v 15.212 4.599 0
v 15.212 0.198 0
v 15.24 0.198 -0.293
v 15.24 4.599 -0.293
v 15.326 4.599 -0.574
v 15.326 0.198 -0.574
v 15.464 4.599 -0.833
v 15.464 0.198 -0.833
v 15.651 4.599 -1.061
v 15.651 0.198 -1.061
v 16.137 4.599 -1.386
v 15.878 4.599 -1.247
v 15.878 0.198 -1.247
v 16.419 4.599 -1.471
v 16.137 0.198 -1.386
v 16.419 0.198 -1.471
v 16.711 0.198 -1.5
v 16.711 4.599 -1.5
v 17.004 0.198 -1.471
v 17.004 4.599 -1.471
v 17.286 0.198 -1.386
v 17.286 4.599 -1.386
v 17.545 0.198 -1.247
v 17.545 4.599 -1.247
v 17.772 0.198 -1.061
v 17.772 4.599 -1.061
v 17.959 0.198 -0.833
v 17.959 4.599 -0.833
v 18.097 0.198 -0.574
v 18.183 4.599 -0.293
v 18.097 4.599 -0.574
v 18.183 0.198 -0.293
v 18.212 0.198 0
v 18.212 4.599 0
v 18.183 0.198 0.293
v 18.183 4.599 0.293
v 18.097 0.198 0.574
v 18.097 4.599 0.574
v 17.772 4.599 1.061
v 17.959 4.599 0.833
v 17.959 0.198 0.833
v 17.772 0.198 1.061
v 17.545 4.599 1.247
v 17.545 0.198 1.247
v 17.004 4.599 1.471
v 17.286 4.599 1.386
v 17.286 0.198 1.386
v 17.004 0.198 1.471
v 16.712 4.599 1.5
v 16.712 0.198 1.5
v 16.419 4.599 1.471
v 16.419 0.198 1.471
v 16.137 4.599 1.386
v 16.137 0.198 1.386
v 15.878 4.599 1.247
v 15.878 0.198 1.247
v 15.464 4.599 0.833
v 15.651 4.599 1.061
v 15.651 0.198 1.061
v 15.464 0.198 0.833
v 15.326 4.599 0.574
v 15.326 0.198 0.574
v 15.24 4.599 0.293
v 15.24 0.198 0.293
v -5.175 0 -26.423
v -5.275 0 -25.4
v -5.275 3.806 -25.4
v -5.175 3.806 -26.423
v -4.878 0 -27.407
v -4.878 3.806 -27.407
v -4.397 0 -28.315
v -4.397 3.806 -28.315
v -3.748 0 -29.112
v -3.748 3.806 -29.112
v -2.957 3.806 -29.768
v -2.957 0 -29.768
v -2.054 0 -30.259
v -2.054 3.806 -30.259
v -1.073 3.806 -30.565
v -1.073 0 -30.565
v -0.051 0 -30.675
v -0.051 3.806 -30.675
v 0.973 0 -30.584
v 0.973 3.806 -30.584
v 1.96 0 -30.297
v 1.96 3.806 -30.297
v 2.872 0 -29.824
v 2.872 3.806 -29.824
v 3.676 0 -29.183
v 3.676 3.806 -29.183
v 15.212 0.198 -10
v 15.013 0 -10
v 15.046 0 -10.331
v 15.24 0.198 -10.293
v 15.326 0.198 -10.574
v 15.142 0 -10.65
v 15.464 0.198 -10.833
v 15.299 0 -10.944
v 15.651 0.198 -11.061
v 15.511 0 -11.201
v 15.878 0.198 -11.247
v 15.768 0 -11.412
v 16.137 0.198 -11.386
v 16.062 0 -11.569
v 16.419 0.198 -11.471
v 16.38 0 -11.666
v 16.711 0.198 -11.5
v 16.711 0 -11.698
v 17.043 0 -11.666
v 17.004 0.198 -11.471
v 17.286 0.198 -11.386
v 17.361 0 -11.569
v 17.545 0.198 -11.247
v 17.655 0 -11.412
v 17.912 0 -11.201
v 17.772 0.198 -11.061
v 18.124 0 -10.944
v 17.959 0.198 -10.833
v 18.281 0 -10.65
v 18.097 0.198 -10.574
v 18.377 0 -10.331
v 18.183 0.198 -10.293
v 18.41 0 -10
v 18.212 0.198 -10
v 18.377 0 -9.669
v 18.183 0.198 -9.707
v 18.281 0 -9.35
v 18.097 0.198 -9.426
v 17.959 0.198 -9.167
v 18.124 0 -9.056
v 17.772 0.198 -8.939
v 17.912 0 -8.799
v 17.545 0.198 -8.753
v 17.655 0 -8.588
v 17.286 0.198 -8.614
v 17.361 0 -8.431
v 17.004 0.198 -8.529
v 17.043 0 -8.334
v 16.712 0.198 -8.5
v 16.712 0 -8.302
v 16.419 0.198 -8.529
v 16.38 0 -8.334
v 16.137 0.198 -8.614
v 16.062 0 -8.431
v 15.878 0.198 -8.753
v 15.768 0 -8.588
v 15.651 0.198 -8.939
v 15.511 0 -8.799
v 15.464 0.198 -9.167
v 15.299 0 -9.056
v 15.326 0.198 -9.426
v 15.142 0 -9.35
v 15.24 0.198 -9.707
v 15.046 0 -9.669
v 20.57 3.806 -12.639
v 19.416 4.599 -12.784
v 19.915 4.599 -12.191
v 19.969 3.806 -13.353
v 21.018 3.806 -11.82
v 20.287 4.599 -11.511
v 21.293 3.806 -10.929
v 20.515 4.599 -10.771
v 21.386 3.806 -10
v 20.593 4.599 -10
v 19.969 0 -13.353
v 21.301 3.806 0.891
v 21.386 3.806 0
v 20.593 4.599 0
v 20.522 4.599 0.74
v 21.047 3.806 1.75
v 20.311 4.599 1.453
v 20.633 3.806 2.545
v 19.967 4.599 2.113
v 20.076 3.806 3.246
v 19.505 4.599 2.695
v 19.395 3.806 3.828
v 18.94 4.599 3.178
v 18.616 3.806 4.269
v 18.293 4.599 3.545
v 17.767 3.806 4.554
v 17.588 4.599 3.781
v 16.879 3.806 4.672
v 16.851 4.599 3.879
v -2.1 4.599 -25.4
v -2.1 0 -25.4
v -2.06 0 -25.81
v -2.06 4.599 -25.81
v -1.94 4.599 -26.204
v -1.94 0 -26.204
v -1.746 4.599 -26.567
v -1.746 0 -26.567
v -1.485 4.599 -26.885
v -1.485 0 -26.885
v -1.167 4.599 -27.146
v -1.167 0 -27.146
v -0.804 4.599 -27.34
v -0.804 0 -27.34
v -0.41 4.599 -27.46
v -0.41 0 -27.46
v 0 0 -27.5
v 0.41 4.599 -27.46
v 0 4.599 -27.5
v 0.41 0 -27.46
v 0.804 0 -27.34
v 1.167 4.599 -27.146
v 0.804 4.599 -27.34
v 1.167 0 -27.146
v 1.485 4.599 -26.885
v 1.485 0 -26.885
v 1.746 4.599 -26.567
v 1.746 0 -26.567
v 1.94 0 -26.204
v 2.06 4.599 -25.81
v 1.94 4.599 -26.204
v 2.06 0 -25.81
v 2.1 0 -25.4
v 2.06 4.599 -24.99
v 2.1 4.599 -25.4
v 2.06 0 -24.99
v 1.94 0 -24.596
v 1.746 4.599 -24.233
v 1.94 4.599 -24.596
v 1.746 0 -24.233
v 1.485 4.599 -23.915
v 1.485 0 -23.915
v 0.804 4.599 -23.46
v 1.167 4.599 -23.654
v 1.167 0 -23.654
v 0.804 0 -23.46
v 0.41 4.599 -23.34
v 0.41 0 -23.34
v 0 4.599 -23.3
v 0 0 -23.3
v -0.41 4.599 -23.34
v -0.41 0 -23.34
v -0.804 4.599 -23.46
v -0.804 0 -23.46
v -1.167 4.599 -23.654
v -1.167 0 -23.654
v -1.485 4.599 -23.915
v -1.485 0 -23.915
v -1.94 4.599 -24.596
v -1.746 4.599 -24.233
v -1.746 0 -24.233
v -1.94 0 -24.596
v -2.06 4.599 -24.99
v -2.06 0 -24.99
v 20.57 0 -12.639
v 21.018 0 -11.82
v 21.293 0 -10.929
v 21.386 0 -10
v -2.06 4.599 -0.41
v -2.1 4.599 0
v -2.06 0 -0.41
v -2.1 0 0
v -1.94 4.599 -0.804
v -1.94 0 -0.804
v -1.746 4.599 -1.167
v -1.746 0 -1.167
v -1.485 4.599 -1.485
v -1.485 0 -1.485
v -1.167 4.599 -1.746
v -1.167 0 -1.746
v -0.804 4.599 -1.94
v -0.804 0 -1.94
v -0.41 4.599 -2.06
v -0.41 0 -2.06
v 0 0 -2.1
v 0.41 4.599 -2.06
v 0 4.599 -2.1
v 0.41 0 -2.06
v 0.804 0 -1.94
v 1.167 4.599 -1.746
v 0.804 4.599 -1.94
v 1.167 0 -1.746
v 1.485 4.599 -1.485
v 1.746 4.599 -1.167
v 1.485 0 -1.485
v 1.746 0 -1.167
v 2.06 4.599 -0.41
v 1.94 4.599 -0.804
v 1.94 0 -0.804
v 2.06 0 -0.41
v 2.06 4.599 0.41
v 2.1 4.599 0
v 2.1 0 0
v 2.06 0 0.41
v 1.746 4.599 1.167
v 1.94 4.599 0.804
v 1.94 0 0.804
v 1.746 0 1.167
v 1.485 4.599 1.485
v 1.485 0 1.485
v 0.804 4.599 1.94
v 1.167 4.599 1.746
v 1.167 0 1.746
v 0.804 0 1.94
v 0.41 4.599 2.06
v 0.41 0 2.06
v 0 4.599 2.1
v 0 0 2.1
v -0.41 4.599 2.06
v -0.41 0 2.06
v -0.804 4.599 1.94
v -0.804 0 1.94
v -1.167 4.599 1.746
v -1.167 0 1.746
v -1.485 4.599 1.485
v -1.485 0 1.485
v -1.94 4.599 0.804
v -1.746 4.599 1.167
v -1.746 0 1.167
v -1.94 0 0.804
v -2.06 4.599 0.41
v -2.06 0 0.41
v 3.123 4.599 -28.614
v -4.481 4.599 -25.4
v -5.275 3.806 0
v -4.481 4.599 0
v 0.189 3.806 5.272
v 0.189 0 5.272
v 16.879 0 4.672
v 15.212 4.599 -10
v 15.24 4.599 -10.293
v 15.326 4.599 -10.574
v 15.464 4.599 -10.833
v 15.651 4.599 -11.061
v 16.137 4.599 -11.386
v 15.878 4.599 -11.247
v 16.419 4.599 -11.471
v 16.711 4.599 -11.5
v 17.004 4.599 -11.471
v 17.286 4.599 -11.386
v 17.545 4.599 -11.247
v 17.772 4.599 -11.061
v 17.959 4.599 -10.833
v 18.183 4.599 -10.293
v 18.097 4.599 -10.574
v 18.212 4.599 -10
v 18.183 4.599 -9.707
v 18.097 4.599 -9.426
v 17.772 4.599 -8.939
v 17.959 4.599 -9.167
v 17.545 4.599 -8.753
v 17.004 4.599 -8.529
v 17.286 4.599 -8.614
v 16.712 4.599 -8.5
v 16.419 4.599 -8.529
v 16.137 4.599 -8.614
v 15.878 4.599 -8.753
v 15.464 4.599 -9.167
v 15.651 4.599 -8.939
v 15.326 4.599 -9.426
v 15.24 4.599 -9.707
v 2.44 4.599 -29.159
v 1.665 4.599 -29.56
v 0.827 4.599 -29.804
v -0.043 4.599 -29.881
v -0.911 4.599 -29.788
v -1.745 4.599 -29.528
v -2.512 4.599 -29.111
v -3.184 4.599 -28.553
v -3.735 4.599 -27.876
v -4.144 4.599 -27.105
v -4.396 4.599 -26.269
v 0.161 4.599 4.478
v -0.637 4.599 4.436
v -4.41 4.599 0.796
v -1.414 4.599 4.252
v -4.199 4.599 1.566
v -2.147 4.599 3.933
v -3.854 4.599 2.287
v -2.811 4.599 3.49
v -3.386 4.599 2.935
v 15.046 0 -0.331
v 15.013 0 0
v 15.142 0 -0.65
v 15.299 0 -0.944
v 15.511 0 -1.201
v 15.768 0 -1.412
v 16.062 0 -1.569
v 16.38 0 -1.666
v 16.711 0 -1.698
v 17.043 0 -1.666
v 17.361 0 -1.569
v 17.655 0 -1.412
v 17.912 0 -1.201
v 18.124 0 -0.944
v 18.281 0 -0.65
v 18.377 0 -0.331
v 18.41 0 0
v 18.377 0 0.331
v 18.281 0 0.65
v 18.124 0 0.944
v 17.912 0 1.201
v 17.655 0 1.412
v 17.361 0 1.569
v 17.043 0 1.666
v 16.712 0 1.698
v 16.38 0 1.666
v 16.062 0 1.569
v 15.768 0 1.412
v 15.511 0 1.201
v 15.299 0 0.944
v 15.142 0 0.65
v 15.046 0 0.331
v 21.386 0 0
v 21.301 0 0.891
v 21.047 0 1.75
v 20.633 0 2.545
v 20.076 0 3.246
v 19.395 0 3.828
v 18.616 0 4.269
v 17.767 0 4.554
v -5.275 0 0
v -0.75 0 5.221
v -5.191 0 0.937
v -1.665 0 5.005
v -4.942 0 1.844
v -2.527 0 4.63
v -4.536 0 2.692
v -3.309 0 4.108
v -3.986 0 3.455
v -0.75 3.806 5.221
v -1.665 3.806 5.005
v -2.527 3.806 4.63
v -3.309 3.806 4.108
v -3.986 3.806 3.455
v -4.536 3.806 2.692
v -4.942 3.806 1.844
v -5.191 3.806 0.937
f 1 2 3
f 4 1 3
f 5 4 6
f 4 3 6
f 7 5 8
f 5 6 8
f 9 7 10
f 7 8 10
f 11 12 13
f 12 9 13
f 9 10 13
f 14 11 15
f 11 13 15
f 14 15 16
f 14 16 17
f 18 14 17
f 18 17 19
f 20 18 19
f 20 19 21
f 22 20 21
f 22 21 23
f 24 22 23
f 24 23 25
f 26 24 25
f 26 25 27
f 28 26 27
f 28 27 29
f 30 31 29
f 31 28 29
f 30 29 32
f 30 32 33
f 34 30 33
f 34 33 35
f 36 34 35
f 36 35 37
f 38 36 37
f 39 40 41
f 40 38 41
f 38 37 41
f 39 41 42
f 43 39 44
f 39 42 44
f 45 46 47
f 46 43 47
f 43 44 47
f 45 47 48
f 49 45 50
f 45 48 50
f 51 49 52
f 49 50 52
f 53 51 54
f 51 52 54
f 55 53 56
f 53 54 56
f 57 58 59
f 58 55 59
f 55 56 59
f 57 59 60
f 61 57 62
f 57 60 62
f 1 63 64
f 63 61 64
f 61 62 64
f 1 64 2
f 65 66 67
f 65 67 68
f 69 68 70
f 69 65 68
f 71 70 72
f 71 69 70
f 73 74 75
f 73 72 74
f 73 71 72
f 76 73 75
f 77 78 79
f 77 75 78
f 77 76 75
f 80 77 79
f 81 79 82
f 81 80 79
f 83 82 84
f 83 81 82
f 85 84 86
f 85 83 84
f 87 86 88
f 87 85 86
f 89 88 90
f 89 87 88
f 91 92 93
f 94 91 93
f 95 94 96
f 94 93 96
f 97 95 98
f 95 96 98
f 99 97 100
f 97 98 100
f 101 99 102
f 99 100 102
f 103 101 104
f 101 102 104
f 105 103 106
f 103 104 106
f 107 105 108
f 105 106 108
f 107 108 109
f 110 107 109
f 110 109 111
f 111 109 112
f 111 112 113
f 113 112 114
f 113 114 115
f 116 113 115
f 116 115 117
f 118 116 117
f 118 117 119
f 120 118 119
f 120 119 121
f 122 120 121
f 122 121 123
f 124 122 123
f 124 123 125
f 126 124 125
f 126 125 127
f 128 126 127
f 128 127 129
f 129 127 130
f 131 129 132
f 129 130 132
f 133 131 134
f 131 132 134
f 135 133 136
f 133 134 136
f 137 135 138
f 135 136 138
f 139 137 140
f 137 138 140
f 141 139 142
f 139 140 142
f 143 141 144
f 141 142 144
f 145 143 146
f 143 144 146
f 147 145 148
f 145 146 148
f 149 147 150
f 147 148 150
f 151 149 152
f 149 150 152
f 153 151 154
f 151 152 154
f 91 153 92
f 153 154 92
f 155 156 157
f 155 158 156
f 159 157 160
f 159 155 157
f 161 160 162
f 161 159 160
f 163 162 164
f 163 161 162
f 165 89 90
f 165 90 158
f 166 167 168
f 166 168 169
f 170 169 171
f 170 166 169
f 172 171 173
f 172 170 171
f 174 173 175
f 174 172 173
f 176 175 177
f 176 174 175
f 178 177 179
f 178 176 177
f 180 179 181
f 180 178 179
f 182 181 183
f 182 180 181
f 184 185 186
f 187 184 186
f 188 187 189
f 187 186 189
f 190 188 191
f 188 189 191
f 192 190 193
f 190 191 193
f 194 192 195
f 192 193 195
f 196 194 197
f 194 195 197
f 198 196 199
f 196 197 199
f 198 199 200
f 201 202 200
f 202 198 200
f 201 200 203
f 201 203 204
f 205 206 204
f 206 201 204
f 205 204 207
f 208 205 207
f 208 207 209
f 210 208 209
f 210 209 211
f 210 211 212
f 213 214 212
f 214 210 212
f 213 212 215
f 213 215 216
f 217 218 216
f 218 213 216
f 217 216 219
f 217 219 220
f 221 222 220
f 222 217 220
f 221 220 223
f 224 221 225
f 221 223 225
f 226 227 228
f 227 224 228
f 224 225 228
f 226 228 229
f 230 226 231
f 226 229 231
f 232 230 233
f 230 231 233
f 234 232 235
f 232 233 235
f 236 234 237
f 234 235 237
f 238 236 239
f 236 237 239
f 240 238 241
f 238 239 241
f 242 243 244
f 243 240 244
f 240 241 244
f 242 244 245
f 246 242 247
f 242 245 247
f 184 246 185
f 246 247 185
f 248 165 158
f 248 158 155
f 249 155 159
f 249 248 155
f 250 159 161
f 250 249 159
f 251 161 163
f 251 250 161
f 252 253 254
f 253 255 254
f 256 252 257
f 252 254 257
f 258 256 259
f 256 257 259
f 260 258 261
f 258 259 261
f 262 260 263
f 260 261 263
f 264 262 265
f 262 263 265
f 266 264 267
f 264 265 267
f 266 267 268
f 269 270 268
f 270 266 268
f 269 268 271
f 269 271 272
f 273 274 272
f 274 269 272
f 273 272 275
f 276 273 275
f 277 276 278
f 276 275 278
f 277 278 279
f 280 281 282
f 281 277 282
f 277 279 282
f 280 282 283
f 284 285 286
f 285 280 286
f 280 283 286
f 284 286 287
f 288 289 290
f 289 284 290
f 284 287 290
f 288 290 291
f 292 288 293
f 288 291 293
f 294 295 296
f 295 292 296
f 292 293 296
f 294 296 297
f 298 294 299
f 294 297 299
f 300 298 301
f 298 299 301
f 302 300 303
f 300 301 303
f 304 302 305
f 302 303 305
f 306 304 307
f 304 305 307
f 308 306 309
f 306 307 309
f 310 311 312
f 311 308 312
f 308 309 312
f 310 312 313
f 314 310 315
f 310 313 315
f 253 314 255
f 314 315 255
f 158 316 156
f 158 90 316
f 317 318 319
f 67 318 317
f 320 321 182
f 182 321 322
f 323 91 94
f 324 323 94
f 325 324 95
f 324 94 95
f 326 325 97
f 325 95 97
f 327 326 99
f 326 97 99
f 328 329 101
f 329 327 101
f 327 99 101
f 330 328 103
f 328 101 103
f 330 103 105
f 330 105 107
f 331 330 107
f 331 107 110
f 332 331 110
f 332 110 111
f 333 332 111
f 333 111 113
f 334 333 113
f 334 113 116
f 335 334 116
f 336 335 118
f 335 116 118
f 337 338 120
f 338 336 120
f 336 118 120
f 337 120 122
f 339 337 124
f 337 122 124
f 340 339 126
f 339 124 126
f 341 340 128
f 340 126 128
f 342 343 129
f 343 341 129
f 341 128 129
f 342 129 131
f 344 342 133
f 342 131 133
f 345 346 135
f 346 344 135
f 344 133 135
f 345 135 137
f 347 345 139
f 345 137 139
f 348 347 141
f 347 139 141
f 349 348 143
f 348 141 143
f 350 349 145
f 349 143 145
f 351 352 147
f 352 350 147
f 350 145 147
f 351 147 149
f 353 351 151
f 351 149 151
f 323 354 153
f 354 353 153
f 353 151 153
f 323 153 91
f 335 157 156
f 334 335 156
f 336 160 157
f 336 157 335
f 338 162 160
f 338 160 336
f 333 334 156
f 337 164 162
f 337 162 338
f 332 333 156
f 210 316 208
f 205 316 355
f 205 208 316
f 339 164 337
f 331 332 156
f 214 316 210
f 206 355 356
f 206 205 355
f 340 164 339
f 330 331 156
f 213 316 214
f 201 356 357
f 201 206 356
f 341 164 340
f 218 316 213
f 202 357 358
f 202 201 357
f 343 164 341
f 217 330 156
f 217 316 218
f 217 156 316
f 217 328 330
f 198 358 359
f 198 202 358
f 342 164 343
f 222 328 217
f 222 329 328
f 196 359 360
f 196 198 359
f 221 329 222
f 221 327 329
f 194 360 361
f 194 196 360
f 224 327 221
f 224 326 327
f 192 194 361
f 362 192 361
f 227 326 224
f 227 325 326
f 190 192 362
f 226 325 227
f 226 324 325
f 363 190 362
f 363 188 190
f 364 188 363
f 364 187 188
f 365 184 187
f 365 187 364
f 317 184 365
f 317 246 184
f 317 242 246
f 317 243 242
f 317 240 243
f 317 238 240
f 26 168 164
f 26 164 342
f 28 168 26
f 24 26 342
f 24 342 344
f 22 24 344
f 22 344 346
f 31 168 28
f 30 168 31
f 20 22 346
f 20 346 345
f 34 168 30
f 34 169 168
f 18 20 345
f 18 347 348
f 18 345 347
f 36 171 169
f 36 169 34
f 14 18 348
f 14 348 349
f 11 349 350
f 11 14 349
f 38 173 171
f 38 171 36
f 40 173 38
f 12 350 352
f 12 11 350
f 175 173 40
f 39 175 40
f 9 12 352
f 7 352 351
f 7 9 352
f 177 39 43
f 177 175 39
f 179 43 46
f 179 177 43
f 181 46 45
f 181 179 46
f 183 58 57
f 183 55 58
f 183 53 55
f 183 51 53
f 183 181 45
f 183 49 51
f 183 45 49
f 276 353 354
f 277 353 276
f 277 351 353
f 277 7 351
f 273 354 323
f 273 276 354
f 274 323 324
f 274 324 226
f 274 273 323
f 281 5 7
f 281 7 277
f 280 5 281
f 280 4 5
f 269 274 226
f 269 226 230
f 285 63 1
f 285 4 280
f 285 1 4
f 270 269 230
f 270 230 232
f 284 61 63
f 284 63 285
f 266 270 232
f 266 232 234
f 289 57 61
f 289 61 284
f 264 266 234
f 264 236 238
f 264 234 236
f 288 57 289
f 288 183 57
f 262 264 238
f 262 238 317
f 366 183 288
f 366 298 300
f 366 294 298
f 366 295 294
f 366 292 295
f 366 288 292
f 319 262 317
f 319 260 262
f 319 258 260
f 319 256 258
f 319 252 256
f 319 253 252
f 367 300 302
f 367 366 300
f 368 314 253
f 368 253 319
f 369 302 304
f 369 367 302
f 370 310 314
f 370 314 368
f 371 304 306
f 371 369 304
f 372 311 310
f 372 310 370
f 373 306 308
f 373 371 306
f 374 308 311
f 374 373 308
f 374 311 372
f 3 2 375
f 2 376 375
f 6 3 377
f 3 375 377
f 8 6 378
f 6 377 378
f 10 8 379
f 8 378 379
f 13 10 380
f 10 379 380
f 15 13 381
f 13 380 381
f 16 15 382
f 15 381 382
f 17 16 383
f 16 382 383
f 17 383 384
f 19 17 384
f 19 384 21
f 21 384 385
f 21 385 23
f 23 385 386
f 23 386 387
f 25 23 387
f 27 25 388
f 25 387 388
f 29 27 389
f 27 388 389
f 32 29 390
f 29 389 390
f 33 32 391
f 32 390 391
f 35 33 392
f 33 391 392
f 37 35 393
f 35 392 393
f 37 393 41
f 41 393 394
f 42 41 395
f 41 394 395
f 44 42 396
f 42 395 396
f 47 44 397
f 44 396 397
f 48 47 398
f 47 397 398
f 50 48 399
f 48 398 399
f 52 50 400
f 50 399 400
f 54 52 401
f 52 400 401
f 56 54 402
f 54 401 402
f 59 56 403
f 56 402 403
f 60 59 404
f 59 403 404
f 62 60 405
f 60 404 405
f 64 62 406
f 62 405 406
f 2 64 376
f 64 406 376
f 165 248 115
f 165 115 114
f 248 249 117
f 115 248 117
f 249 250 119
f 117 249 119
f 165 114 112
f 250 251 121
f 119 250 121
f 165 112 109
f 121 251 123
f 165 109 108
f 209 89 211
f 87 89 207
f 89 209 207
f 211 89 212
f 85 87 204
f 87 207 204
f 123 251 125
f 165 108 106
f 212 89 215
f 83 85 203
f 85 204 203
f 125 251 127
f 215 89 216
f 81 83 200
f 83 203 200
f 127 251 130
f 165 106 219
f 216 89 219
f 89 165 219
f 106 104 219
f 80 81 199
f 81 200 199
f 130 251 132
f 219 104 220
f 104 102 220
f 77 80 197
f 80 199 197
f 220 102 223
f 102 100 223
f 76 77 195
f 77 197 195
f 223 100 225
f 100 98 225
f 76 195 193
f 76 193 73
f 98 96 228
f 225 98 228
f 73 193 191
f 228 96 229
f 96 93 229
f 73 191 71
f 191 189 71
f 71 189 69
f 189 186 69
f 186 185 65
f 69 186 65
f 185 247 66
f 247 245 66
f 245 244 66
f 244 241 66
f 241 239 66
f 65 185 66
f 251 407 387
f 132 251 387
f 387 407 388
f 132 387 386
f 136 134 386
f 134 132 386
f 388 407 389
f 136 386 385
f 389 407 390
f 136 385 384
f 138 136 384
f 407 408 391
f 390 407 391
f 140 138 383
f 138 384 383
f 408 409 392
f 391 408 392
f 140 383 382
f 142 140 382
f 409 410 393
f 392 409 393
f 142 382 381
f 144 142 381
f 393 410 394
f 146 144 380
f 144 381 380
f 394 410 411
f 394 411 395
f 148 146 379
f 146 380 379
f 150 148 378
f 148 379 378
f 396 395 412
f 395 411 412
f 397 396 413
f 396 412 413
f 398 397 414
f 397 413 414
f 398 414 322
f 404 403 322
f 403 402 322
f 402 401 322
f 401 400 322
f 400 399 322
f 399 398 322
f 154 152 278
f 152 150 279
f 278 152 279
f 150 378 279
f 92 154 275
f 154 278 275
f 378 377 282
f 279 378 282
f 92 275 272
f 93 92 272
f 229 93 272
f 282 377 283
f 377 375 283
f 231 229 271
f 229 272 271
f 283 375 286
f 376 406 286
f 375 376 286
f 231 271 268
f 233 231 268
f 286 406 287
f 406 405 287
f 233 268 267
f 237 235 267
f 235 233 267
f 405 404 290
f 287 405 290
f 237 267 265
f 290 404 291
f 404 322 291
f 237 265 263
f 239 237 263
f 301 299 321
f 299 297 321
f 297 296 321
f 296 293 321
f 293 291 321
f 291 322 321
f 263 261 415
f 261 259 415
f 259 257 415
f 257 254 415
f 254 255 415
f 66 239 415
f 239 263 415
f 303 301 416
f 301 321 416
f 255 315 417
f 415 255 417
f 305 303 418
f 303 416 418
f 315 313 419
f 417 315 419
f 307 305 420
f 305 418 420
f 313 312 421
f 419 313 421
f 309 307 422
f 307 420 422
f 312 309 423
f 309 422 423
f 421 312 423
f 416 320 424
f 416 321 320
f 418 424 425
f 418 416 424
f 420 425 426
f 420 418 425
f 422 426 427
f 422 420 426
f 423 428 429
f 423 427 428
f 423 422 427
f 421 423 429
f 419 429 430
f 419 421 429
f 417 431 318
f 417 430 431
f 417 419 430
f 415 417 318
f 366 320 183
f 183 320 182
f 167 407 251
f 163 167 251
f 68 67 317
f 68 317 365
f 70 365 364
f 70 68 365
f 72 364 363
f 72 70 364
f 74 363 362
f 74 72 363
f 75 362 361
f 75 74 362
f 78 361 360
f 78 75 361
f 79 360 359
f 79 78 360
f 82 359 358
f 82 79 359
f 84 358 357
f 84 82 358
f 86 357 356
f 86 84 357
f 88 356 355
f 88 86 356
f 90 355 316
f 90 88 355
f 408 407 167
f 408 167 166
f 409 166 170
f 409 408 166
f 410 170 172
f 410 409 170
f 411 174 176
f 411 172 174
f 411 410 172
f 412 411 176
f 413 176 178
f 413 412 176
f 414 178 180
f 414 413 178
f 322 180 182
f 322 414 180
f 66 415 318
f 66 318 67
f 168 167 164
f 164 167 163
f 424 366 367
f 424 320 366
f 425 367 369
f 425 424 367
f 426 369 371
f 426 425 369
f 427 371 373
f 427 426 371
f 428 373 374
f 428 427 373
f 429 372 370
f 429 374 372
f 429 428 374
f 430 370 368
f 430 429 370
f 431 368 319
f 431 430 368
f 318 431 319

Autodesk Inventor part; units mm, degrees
ref_plane "YZ Plane" through (0, 0, 0) normal (1, 0, 0) x (0, 1, 0)
ref_plane "XZ Plane" through (0, 0, 0) normal (0, 1, 0) x (-1, 0, 0)
ref_plane "XY Plane" through (0, 0, 0) normal (0, 0, 1) x (1, 0, 0)
sketch "Sketch1" plane through (0, 0, 0) normal (0, 1, 0) x (-1, 0, 0)
  circle A0 centre (0, 0) radius 2.1
  circle A1 centre (0, -25.4) radius 2.1
  circle A2 centre (-16.7115, 0) radius 1.5
  circle A3 centre (-16.7115, -10) radius 1.5
  circle A4 centre (0, 0) radius 5.275 construction
  circle A5 centre (0, -25.4) radius 5.275 construction
  circle A6 centre (-16.7115, 0) radius 4.675 construction
  circle A7 centre (-16.7115, -10) radius 4.675 construction
  line L0 (-0.1894, 5.2716) -> (-16.8793, 4.672)
  line L1 (5.275, 0) -> (5.275, -25.4)
  line L2 (-3.6758, -29.1834) -> (-19.9692, -13.353)
  line L3 (-21.3865, 0) -> (-21.3865, -10)
  arc A8 (-3.6758, -29.1834) -> (5.275, -25.4) centre (0, -25.4) ccw
  arc A9 (5.275, 0) -> (-0.1894, 5.2716) centre (0, 0) ccw
  arc A10 (-16.8793, 4.672) -> (-21.3865, 0) centre (-16.7115, 0) ccw
  arc A11 (-21.3865, -10) -> (-19.9692, -13.353) centre (-16.7115, -10) ccw
  dimension "d0" = 4.2
  dimension "d1" = 25.4
  dimension "d2" = 16.7115
  dimension "d3" = 3
  dimension "d4" = 10
  dimension "d5" = 3.175
  dimension "d6" = 3.175
extrude "Extrusion1" add sketch "Sketch1" along normal blind 4.5994
chamfer "Chamfer1" distance 0.1984 angle 45 2 edges at (18.2115, 0, 0) (18.2115, 0, -10)
chamfer "Chamfer2" distance 0.7937 angle 45 8 edges at (-2.0537, 4.5994, -30.2588) (-5.275, 4.5994, -12.7) (-3.6624, 4.5994, 3.7964) (8.5344, 4.5994, 4.9718) (20.076, 4.5994, 3.2458) (21.3865, 4.5994, -5) (21.0176, 4.5994, -11.8201) (11.8225, 4.5994, -21.2682)
equation "\"d6\" = d5"
properties part number "CNC-025-YAxisCableCarrierMount" material "ABS Plastic"
